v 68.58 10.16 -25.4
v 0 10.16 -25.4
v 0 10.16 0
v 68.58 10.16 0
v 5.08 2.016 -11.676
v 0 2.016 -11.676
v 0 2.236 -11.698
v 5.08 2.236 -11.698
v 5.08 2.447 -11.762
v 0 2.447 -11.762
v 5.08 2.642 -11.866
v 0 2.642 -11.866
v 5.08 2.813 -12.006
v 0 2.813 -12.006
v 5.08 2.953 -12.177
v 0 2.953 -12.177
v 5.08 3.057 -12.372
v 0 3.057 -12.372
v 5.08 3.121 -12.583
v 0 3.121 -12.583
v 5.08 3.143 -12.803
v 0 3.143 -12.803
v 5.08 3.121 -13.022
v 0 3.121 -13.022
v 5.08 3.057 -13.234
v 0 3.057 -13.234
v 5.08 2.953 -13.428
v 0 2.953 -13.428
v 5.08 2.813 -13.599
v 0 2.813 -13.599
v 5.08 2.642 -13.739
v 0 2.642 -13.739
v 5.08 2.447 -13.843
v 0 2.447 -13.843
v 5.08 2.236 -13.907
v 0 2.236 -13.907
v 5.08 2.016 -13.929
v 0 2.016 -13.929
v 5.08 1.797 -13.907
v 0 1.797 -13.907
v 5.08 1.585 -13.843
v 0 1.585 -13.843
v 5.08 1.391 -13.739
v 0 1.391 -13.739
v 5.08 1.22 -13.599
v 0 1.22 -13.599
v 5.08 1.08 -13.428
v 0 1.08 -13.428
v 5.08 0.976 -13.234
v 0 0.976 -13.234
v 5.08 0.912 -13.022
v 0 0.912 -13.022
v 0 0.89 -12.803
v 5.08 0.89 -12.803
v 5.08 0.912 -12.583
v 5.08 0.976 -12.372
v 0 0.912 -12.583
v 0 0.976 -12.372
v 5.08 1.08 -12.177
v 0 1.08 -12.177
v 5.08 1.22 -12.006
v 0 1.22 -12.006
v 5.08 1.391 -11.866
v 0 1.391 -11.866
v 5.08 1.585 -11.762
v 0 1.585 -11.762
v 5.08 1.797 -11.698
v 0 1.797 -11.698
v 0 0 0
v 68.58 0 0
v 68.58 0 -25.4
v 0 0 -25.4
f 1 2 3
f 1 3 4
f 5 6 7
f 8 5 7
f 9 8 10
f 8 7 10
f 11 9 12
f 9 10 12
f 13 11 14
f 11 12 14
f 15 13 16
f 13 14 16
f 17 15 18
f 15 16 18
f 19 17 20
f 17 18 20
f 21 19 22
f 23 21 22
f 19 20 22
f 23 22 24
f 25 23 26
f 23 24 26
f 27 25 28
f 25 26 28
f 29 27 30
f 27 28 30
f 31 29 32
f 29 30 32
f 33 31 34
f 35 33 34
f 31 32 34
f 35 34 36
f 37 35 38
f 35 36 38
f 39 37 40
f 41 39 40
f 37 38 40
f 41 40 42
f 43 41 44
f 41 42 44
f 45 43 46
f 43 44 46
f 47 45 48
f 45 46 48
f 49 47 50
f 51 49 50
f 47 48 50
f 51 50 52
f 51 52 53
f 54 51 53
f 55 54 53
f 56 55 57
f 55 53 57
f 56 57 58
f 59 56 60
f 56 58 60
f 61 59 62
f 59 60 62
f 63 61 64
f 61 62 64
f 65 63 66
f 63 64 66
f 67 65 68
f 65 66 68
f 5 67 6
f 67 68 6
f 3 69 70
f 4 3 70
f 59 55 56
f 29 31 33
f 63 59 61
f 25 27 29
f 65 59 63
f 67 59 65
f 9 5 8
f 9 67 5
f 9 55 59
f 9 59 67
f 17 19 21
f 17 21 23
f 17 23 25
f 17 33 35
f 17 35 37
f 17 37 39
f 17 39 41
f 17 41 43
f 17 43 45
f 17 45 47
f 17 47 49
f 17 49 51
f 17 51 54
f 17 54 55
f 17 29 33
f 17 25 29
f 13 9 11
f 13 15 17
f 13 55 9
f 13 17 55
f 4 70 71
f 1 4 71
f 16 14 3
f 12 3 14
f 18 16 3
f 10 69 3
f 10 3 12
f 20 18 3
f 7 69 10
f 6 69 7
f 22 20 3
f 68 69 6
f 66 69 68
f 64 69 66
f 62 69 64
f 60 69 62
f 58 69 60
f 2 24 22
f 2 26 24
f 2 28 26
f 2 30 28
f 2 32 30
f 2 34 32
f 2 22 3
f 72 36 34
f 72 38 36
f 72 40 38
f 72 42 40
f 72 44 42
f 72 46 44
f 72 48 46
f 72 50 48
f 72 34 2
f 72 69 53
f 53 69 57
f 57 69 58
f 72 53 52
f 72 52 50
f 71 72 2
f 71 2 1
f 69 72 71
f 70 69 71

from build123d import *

# Parameters (mm, degrees)
SKETCH1_W           = 68.58
SKETCH1_H           = 25.4
BOSS_EXTRUDE1_DEPTH = 10.16
SKETCH2_R           = 1.126258331
CUT_EXTRUDE1_DEPTH  = 5.08


with BuildPart() as part:
    # Sketch1 → Boss-Extrude1 (new body)
    with BuildSketch(Plane(origin=(0, 0, 0), x_dir=(1, 0, 0), z_dir=(0, 1, 0))):
        with Locations((34.29, 12.7)):
            Rectangle(SKETCH1_W, SKETCH1_H)
    extrude(amount=BOSS_EXTRUDE1_DEPTH)

    # Sketch2 → Cut-Extrude1 (cut)
    with BuildSketch(Plane.ZY):
        with Locations((-12.802546148, 2.016433815)):
            Circle(SKETCH2_R)
    extrude(amount=-CUT_EXTRUDE1_DEPTH, mode=Mode.SUBTRACT)


solid = part.part
